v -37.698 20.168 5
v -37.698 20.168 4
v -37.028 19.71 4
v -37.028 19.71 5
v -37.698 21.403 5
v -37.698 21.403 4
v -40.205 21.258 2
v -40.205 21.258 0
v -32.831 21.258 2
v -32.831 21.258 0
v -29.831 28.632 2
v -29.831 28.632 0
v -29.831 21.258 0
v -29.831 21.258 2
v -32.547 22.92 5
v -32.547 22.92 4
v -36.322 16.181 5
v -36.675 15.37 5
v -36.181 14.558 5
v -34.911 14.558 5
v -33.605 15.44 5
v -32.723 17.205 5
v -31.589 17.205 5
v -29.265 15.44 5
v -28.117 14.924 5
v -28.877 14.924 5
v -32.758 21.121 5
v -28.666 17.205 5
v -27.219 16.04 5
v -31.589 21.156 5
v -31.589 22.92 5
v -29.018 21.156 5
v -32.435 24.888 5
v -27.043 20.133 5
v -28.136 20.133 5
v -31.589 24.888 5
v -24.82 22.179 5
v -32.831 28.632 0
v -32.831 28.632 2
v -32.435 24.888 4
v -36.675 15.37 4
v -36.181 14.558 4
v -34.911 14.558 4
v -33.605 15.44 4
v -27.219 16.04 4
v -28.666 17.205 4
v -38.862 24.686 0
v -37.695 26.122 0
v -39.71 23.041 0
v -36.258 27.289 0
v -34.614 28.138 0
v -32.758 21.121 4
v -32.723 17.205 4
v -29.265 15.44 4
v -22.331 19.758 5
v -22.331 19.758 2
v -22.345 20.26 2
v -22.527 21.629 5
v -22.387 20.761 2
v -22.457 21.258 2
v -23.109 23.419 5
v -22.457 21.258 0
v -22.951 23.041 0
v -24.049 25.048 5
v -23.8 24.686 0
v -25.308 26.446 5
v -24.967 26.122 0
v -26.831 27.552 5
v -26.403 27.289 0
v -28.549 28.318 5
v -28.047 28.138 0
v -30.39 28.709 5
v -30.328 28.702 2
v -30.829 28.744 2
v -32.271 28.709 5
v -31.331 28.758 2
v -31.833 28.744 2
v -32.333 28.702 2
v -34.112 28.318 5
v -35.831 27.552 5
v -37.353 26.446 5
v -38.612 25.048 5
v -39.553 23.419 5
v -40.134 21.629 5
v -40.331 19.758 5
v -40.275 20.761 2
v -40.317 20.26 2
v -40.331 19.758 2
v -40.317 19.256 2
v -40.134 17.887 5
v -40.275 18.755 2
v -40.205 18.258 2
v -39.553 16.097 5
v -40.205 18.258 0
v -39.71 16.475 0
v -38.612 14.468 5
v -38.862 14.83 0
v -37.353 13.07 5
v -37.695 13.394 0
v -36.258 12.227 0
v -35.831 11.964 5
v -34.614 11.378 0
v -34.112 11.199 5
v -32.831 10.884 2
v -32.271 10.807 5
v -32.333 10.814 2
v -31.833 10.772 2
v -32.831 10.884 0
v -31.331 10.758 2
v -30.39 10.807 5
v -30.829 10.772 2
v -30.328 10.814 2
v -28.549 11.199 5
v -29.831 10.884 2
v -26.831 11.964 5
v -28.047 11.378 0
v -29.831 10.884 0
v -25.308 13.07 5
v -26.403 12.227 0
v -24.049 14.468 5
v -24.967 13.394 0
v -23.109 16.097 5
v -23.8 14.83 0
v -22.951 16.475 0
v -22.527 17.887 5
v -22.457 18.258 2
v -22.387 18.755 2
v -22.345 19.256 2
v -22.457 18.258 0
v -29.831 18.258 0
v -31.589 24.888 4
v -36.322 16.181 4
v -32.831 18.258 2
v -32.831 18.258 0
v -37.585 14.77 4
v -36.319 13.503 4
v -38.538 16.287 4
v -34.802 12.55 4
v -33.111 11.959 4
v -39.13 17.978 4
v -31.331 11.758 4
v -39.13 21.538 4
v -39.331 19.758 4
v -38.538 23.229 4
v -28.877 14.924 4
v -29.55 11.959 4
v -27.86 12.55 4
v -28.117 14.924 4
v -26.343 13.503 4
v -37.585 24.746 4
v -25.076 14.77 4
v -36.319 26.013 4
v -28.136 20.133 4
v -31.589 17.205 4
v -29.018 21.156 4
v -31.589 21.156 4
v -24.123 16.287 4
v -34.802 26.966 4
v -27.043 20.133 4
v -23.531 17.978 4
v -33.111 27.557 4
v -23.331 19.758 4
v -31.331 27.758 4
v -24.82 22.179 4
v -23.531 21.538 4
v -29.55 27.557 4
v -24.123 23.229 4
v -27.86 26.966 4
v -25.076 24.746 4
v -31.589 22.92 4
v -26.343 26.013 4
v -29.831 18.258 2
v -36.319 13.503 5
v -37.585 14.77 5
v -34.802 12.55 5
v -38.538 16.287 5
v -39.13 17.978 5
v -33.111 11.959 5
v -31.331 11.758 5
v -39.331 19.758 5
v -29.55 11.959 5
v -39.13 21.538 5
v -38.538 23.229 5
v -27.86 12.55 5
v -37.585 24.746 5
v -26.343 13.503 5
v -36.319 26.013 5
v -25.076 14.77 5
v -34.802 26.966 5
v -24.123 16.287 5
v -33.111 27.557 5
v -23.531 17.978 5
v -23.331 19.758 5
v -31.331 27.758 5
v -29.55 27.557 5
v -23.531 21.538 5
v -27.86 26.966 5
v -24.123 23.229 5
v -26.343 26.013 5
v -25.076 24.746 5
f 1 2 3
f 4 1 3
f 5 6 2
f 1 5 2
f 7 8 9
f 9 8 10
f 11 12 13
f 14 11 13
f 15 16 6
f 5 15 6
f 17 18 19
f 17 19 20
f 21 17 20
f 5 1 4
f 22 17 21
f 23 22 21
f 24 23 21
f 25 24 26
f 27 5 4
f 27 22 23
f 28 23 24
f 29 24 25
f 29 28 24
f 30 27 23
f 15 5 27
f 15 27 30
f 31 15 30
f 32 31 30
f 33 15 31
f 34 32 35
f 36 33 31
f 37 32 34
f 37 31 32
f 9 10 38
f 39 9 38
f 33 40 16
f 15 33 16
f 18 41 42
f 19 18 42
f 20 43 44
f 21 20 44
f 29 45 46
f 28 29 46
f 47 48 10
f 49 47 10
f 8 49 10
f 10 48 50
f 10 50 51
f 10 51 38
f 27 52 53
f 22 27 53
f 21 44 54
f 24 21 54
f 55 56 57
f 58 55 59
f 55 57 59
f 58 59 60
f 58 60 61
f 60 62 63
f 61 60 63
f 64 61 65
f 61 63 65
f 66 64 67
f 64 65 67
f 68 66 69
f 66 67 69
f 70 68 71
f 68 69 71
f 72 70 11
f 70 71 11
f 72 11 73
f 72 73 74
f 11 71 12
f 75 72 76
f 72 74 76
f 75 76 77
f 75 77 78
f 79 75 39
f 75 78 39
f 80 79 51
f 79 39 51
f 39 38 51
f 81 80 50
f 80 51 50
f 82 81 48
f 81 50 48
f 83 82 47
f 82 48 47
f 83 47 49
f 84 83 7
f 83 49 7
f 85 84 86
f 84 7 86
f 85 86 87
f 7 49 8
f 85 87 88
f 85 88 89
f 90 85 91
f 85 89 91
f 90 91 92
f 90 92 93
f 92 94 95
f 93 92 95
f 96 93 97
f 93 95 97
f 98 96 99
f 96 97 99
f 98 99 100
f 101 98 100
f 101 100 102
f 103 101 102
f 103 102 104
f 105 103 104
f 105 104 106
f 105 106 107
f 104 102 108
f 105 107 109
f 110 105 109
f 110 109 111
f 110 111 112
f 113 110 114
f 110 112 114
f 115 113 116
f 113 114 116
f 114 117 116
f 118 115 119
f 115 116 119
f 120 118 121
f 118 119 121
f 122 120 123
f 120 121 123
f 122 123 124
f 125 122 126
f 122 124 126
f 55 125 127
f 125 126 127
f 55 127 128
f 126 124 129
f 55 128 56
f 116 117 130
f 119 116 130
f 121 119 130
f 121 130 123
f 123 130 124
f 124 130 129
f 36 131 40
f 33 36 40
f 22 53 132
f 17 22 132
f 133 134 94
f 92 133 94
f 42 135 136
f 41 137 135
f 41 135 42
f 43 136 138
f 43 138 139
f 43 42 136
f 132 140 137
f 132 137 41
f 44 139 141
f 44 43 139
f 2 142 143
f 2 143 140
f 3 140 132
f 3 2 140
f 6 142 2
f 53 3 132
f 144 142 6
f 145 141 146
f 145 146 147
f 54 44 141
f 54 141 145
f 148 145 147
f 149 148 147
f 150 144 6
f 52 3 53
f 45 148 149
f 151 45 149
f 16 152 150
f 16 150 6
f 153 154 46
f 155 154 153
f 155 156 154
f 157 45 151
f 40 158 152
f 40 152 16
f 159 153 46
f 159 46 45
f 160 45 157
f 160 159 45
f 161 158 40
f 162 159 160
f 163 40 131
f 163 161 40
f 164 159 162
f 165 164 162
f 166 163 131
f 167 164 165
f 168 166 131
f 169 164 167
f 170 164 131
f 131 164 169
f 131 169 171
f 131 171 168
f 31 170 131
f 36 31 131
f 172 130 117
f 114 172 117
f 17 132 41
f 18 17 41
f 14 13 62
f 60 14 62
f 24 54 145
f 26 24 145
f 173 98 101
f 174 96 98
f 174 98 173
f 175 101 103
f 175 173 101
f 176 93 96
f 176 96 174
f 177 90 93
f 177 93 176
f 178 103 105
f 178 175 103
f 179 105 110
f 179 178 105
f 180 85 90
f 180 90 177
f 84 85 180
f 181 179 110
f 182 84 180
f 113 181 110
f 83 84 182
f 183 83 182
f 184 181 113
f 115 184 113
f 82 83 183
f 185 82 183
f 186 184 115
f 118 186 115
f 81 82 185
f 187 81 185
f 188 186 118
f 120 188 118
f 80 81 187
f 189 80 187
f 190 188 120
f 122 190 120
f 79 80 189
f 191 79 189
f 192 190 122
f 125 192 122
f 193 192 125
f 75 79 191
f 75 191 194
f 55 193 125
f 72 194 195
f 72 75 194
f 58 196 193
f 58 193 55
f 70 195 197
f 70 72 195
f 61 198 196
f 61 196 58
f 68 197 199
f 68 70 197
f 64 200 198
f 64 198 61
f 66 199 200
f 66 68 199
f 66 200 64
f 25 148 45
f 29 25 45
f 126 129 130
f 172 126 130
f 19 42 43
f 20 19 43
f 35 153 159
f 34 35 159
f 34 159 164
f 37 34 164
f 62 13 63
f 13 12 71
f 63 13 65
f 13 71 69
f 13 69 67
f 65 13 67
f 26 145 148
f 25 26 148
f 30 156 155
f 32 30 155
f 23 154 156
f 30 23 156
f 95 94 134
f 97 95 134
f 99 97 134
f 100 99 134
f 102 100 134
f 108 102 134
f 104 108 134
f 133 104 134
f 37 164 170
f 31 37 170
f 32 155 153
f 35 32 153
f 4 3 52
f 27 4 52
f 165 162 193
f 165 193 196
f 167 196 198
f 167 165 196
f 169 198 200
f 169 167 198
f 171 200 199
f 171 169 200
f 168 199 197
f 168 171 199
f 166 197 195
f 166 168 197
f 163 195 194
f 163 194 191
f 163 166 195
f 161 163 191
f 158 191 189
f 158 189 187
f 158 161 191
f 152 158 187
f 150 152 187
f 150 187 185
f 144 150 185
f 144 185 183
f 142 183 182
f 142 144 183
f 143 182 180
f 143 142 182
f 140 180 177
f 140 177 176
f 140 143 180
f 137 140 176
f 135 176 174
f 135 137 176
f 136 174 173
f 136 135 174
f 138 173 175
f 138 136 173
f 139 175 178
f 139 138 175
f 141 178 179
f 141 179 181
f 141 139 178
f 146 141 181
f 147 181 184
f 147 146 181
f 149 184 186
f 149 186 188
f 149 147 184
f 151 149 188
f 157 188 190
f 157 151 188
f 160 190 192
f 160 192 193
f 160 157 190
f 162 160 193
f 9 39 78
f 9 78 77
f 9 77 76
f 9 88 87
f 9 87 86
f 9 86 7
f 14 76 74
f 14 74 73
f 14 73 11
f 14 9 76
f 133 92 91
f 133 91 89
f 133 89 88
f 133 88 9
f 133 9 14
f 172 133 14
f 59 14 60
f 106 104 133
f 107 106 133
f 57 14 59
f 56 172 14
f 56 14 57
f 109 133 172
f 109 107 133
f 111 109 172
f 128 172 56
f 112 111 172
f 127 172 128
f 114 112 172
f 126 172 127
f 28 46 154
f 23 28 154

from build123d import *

# Parameters (mm, degrees)
F0_R     = 9
F1_DEPTH = 4
F3_W     = 3
F3_H     = 3
F4_DEPTH = 2
F2_R     = 9
F2_R_2   = 8
F5_DEPTH = 1


with BuildPart() as f1:
    # F0 (on Top) → F1 (new body)
    with BuildSketch(Plane.XY):
        with Locations((-31.3306450844, 19.7580661625)):
            Circle(F0_R)
    extrude(amount=F1_DEPTH)

    # F3 (on face) → F4 (cut)
    with BuildSketch(Plane(origin=(0, 0, 0), x_dir=(1, 0, 0), z_dir=(0, 0, -1))):
        with BuildLine():
            ThreePointArc((-32.8306450844, -28.6321858371), (-32.0832814269, -28.7265408676), (-31.3306450844, -28.7580661625))
            ThreePointArc((-31.3306450844, -28.7580661625), (-30.5780087419, -28.7265408676), (-29.8306450844, -28.6321858371))
            Line((-29.8306450844, -28.6321858371), (-29.8306450844, -21.2580661625))
            Line((-29.8306450844, -21.2580661625), (-32.8306450844, -21.2580661625))
            Line((-32.8306450844, -21.2580661625), (-32.8306450844, -28.6321858371))
        make_face()
        with BuildLine():
            ThreePointArc((-40.204764759, -18.2580661625), (-40.2991197895, -19.0054298199), (-40.3306450844, -19.7580661625))
            ThreePointArc((-40.3306450844, -19.7580661625), (-40.2991197895, -20.510702505), (-40.204764759, -21.2580661625))
            Line((-40.204764759, -21.2580661625), (-32.8306450844, -21.2580661625))
            Line((-32.8306450844, -21.2580661625), (-32.8306450844, -18.2580661625))
            Line((-32.8306450844, -18.2580661625), (-40.204764759, -18.2580661625))
        make_face()
        with Locations((-31.3306450844, -19.7580661625)):
            Rectangle(F3_W, F3_H)
        with BuildLine():
            Line((-29.8306450844, -18.2580661625), (-29.8306450844, -21.2580661625))
            Line((-29.8306450844, -21.2580661625), (-22.4565254097, -21.2580661625))
            ThreePointArc((-22.4565254097, -21.2580661625), (-22.3621703793, -20.510702505), (-22.3306450844, -19.7580661625))
            ThreePointArc((-22.3306450844, -19.7580661625), (-22.3621703793, -19.0054298199), (-22.4565254097, -18.2580661625))
            Line((-22.4565254097, -18.2580661625), (-29.8306450844, -18.2580661625))
        make_face()
        with BuildLine():
            Line((-32.8306450844, -10.8839464878), (-32.8306450844, -18.2580661625))
            Line((-32.8306450844, -18.2580661625), (-29.8306450844, -18.2580661625))
            Line((-29.8306450844, -18.2580661625), (-29.8306450844, -10.8839464878))
            ThreePointArc((-29.8306450844, -10.8839464878), (-30.5780087419, -10.7895914574), (-31.3306450844, -10.7580661625))
            ThreePointArc((-31.3306450844, -10.7580661625), (-32.0832814269, -10.7895914574), (-32.8306450844, -10.8839464878))
        make_face()
    extrude(amount=-F4_DEPTH, mode=Mode.SUBTRACT)

    # F2 (on face) → F5 (join)
    with BuildSketch(Plane.XY.offset(4)):
        with Locations((-31.3306450844, 19.7580661625)):
            Circle(F2_R)
        with Locations((-31.3306450844, 19.7580661625)):
            Circle(F2_R_2, mode=Mode.SUBTRACT)
        Polygon((-31.5887257457, 24.8875524849), (-32.4354991317, 24.8875524849), (-32.5466804206, 22.920306772), (-37.6978889108, 21.4031711221), (-37.6978889108, 20.1682914048), (-37.0275266469, 19.7096224874), (-32.7583737671, 21.1209114641), (-32.7230915427, 17.2045808285), (-36.3218821585, 16.1813963205), (-36.6747044027, 15.3699042276), (-36.1807532609, 14.5584121346), (-34.9105931818, 14.5584121346), (-33.6051471531, 15.4404686764), (-29.2654298246, 15.4404686764), (-28.877325356, 14.9242647582), (-28.1173038363, 14.9242647582), (-27.2190589458, 16.0402674228), (-28.6656320095, 17.2045808285), (-31.5887257457, 17.2045808285), (-31.5887257457, 21.1561955512), (-29.0184542537, 21.1561955512), (-28.1363967806, 20.1330091804), (-27.0426478237, 20.1330091804), (-24.8198658228, 22.1793800592), (-31.5887257457, 22.920306772), align=None)
    extrude(amount=F5_DEPTH)


solid = f1.part
